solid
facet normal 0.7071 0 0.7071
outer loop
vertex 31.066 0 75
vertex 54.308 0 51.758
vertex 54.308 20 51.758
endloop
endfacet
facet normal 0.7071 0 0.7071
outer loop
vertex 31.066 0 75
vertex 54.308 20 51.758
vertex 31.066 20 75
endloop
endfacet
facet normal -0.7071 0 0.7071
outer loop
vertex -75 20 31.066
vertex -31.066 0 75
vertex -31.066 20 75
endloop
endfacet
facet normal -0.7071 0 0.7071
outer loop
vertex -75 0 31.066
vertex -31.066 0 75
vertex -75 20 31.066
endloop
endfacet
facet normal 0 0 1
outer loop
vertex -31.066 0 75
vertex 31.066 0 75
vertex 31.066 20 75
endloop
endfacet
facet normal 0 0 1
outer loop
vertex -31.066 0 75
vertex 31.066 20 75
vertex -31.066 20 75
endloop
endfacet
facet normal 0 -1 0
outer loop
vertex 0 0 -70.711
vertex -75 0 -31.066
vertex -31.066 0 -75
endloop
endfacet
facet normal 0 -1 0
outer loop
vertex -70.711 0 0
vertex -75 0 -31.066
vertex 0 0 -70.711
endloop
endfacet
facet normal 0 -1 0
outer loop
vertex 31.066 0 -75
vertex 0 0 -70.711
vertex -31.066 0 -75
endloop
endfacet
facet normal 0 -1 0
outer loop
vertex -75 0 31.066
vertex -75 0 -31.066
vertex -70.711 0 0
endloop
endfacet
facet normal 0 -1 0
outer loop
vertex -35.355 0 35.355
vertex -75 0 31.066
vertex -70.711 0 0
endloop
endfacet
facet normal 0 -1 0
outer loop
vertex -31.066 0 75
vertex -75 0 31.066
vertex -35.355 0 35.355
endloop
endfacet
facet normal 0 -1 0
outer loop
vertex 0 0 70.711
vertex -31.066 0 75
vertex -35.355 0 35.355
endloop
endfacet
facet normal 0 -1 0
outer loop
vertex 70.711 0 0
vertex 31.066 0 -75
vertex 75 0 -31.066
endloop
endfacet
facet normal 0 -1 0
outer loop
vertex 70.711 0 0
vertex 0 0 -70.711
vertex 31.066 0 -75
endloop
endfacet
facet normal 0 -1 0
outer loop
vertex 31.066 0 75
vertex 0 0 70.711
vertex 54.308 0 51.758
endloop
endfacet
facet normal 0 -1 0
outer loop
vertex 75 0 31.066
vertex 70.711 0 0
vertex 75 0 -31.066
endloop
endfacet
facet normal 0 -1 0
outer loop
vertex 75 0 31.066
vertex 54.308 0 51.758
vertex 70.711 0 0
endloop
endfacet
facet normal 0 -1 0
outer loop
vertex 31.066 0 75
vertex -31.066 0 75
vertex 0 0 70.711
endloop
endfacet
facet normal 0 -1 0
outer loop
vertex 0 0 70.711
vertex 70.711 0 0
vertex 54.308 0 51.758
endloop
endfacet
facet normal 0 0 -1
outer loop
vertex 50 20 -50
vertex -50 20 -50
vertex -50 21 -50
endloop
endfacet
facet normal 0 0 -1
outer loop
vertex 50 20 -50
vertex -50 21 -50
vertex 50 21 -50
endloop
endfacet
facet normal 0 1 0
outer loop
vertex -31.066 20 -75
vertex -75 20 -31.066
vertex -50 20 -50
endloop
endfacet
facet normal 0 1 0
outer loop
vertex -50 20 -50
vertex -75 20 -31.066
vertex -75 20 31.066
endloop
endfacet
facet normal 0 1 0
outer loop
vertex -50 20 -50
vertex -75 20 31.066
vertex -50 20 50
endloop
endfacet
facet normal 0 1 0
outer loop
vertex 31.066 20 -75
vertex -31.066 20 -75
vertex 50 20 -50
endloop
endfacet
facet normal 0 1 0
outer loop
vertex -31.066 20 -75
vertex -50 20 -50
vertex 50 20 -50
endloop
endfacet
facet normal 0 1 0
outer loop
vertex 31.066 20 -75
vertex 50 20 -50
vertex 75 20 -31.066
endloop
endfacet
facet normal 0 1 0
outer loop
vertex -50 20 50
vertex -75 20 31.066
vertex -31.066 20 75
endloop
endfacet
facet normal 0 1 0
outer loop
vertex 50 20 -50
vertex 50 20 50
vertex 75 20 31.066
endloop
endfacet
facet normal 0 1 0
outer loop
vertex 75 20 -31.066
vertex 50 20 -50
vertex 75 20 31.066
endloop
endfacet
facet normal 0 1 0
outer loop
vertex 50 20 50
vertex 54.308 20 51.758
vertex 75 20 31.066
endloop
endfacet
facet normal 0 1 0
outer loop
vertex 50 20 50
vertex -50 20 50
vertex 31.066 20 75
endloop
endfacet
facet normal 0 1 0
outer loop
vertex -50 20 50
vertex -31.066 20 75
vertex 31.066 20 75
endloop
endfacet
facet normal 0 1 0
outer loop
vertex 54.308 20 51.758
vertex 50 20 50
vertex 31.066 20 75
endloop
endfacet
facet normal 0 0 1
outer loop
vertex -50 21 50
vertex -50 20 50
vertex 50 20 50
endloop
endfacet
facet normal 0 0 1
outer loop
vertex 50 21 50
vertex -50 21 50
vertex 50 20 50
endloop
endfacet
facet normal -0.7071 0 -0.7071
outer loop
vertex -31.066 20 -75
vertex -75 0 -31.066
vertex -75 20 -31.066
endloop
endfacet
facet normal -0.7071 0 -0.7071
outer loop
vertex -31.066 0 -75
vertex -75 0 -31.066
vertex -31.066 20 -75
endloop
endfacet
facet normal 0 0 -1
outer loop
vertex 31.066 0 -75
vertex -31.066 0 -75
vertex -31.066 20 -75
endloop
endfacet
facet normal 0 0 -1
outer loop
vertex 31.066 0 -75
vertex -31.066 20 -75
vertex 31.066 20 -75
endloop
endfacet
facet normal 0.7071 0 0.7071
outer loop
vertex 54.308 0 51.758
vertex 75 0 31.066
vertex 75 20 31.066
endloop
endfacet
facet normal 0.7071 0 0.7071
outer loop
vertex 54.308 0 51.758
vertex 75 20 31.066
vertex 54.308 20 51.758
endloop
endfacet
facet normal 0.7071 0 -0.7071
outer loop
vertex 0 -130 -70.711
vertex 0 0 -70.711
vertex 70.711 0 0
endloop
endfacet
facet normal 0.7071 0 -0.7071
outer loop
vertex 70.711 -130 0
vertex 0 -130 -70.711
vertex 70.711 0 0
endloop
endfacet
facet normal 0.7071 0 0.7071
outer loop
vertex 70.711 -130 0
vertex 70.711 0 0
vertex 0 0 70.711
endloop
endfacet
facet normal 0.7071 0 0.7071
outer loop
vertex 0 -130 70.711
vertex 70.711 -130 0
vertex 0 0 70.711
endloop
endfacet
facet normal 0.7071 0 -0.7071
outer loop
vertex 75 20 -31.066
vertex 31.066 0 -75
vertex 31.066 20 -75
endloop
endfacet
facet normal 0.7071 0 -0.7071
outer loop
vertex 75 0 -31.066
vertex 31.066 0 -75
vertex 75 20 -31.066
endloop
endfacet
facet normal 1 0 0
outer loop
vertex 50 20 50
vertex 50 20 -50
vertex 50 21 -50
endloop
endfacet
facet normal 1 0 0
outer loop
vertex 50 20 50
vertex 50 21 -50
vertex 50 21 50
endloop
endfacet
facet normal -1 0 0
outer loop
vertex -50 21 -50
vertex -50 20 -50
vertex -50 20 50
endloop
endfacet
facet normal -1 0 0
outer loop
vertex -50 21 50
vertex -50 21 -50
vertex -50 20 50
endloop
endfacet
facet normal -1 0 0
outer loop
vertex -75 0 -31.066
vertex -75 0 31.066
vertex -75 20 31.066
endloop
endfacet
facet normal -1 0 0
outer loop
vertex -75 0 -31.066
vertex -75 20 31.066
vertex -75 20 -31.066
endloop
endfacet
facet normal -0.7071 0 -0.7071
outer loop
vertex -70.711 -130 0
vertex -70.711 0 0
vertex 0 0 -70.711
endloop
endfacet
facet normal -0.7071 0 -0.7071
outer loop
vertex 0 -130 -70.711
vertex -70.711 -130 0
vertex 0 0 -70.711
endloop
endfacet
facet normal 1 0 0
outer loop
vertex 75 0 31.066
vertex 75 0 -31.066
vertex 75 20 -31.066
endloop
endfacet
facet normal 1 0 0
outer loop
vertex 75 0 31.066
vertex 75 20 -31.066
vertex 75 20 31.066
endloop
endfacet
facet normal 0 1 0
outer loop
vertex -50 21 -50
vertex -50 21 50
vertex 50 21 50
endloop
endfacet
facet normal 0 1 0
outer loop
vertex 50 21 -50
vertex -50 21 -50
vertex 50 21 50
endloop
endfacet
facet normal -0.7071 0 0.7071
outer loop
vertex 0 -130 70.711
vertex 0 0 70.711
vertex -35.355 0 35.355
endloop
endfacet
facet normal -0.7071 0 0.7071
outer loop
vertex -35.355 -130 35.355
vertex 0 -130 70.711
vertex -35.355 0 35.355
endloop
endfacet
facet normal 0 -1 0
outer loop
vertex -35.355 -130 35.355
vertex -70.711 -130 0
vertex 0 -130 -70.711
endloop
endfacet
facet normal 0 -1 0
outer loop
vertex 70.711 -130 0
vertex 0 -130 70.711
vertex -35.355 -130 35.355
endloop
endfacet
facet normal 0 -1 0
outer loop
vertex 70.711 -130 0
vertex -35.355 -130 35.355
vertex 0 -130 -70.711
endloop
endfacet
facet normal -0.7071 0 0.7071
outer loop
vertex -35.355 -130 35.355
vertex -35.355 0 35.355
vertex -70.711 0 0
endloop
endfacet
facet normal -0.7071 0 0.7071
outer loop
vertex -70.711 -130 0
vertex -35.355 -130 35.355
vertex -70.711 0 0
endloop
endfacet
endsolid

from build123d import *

# Parameters (mm, degrees)
F1_DEPTH = 20
F2_W     = 100
F2_H     = 100
F3_DEPTH = 21
F5_DEPTH = 130


with BuildPart() as f1:
    # F0 (on Front) → F1 (new body)
    with BuildSketch(Plane.XZ):
        Polygon((-31.066017178, -75), (31.066017178, -75), (53.033008589, -53.033008589), (-53.033008589, -53.033008589), align=None)
        Polygon((54.3077377365, 51.7582794414), (53.033008589, -53.033008589), (75, -31.066017178), (75, 31.066017178), align=None)
        Polygon((-53.033008589, -53.033008589), (53.033008589, -53.033008589), (54.3077377365, 51.7582794414), (-53.033008589, 53.033008589), align=None)
        Polygon((-75, -31.066017178), (-53.033008589, -53.033008589), (-53.033008589, 53.033008589), (-75, 31.066017178), align=None)
        Polygon((-53.033008589, 53.033008589), (54.3077377365, 51.7582794414), (31.066017178, 75), (-31.066017178, 75), align=None)
    extrude(amount=-F1_DEPTH)

    # F2 (on face) → F3 (join)
    with BuildSketch(Plane.XZ):
        Rectangle(F2_W, F2_H)
    extrude(amount=-F3_DEPTH)

    # F4 (on face) → F5 (join)
    with BuildSketch(Plane.XZ):
        Polygon((0, 70.7106781187), (-35.3553390593, 35.3553390593), (-70.7106781187, 0), (0, -70.7106781187), (70.7106781187, 0), align=None)
    extrude(amount=F5_DEPTH)


solid = f1.part
